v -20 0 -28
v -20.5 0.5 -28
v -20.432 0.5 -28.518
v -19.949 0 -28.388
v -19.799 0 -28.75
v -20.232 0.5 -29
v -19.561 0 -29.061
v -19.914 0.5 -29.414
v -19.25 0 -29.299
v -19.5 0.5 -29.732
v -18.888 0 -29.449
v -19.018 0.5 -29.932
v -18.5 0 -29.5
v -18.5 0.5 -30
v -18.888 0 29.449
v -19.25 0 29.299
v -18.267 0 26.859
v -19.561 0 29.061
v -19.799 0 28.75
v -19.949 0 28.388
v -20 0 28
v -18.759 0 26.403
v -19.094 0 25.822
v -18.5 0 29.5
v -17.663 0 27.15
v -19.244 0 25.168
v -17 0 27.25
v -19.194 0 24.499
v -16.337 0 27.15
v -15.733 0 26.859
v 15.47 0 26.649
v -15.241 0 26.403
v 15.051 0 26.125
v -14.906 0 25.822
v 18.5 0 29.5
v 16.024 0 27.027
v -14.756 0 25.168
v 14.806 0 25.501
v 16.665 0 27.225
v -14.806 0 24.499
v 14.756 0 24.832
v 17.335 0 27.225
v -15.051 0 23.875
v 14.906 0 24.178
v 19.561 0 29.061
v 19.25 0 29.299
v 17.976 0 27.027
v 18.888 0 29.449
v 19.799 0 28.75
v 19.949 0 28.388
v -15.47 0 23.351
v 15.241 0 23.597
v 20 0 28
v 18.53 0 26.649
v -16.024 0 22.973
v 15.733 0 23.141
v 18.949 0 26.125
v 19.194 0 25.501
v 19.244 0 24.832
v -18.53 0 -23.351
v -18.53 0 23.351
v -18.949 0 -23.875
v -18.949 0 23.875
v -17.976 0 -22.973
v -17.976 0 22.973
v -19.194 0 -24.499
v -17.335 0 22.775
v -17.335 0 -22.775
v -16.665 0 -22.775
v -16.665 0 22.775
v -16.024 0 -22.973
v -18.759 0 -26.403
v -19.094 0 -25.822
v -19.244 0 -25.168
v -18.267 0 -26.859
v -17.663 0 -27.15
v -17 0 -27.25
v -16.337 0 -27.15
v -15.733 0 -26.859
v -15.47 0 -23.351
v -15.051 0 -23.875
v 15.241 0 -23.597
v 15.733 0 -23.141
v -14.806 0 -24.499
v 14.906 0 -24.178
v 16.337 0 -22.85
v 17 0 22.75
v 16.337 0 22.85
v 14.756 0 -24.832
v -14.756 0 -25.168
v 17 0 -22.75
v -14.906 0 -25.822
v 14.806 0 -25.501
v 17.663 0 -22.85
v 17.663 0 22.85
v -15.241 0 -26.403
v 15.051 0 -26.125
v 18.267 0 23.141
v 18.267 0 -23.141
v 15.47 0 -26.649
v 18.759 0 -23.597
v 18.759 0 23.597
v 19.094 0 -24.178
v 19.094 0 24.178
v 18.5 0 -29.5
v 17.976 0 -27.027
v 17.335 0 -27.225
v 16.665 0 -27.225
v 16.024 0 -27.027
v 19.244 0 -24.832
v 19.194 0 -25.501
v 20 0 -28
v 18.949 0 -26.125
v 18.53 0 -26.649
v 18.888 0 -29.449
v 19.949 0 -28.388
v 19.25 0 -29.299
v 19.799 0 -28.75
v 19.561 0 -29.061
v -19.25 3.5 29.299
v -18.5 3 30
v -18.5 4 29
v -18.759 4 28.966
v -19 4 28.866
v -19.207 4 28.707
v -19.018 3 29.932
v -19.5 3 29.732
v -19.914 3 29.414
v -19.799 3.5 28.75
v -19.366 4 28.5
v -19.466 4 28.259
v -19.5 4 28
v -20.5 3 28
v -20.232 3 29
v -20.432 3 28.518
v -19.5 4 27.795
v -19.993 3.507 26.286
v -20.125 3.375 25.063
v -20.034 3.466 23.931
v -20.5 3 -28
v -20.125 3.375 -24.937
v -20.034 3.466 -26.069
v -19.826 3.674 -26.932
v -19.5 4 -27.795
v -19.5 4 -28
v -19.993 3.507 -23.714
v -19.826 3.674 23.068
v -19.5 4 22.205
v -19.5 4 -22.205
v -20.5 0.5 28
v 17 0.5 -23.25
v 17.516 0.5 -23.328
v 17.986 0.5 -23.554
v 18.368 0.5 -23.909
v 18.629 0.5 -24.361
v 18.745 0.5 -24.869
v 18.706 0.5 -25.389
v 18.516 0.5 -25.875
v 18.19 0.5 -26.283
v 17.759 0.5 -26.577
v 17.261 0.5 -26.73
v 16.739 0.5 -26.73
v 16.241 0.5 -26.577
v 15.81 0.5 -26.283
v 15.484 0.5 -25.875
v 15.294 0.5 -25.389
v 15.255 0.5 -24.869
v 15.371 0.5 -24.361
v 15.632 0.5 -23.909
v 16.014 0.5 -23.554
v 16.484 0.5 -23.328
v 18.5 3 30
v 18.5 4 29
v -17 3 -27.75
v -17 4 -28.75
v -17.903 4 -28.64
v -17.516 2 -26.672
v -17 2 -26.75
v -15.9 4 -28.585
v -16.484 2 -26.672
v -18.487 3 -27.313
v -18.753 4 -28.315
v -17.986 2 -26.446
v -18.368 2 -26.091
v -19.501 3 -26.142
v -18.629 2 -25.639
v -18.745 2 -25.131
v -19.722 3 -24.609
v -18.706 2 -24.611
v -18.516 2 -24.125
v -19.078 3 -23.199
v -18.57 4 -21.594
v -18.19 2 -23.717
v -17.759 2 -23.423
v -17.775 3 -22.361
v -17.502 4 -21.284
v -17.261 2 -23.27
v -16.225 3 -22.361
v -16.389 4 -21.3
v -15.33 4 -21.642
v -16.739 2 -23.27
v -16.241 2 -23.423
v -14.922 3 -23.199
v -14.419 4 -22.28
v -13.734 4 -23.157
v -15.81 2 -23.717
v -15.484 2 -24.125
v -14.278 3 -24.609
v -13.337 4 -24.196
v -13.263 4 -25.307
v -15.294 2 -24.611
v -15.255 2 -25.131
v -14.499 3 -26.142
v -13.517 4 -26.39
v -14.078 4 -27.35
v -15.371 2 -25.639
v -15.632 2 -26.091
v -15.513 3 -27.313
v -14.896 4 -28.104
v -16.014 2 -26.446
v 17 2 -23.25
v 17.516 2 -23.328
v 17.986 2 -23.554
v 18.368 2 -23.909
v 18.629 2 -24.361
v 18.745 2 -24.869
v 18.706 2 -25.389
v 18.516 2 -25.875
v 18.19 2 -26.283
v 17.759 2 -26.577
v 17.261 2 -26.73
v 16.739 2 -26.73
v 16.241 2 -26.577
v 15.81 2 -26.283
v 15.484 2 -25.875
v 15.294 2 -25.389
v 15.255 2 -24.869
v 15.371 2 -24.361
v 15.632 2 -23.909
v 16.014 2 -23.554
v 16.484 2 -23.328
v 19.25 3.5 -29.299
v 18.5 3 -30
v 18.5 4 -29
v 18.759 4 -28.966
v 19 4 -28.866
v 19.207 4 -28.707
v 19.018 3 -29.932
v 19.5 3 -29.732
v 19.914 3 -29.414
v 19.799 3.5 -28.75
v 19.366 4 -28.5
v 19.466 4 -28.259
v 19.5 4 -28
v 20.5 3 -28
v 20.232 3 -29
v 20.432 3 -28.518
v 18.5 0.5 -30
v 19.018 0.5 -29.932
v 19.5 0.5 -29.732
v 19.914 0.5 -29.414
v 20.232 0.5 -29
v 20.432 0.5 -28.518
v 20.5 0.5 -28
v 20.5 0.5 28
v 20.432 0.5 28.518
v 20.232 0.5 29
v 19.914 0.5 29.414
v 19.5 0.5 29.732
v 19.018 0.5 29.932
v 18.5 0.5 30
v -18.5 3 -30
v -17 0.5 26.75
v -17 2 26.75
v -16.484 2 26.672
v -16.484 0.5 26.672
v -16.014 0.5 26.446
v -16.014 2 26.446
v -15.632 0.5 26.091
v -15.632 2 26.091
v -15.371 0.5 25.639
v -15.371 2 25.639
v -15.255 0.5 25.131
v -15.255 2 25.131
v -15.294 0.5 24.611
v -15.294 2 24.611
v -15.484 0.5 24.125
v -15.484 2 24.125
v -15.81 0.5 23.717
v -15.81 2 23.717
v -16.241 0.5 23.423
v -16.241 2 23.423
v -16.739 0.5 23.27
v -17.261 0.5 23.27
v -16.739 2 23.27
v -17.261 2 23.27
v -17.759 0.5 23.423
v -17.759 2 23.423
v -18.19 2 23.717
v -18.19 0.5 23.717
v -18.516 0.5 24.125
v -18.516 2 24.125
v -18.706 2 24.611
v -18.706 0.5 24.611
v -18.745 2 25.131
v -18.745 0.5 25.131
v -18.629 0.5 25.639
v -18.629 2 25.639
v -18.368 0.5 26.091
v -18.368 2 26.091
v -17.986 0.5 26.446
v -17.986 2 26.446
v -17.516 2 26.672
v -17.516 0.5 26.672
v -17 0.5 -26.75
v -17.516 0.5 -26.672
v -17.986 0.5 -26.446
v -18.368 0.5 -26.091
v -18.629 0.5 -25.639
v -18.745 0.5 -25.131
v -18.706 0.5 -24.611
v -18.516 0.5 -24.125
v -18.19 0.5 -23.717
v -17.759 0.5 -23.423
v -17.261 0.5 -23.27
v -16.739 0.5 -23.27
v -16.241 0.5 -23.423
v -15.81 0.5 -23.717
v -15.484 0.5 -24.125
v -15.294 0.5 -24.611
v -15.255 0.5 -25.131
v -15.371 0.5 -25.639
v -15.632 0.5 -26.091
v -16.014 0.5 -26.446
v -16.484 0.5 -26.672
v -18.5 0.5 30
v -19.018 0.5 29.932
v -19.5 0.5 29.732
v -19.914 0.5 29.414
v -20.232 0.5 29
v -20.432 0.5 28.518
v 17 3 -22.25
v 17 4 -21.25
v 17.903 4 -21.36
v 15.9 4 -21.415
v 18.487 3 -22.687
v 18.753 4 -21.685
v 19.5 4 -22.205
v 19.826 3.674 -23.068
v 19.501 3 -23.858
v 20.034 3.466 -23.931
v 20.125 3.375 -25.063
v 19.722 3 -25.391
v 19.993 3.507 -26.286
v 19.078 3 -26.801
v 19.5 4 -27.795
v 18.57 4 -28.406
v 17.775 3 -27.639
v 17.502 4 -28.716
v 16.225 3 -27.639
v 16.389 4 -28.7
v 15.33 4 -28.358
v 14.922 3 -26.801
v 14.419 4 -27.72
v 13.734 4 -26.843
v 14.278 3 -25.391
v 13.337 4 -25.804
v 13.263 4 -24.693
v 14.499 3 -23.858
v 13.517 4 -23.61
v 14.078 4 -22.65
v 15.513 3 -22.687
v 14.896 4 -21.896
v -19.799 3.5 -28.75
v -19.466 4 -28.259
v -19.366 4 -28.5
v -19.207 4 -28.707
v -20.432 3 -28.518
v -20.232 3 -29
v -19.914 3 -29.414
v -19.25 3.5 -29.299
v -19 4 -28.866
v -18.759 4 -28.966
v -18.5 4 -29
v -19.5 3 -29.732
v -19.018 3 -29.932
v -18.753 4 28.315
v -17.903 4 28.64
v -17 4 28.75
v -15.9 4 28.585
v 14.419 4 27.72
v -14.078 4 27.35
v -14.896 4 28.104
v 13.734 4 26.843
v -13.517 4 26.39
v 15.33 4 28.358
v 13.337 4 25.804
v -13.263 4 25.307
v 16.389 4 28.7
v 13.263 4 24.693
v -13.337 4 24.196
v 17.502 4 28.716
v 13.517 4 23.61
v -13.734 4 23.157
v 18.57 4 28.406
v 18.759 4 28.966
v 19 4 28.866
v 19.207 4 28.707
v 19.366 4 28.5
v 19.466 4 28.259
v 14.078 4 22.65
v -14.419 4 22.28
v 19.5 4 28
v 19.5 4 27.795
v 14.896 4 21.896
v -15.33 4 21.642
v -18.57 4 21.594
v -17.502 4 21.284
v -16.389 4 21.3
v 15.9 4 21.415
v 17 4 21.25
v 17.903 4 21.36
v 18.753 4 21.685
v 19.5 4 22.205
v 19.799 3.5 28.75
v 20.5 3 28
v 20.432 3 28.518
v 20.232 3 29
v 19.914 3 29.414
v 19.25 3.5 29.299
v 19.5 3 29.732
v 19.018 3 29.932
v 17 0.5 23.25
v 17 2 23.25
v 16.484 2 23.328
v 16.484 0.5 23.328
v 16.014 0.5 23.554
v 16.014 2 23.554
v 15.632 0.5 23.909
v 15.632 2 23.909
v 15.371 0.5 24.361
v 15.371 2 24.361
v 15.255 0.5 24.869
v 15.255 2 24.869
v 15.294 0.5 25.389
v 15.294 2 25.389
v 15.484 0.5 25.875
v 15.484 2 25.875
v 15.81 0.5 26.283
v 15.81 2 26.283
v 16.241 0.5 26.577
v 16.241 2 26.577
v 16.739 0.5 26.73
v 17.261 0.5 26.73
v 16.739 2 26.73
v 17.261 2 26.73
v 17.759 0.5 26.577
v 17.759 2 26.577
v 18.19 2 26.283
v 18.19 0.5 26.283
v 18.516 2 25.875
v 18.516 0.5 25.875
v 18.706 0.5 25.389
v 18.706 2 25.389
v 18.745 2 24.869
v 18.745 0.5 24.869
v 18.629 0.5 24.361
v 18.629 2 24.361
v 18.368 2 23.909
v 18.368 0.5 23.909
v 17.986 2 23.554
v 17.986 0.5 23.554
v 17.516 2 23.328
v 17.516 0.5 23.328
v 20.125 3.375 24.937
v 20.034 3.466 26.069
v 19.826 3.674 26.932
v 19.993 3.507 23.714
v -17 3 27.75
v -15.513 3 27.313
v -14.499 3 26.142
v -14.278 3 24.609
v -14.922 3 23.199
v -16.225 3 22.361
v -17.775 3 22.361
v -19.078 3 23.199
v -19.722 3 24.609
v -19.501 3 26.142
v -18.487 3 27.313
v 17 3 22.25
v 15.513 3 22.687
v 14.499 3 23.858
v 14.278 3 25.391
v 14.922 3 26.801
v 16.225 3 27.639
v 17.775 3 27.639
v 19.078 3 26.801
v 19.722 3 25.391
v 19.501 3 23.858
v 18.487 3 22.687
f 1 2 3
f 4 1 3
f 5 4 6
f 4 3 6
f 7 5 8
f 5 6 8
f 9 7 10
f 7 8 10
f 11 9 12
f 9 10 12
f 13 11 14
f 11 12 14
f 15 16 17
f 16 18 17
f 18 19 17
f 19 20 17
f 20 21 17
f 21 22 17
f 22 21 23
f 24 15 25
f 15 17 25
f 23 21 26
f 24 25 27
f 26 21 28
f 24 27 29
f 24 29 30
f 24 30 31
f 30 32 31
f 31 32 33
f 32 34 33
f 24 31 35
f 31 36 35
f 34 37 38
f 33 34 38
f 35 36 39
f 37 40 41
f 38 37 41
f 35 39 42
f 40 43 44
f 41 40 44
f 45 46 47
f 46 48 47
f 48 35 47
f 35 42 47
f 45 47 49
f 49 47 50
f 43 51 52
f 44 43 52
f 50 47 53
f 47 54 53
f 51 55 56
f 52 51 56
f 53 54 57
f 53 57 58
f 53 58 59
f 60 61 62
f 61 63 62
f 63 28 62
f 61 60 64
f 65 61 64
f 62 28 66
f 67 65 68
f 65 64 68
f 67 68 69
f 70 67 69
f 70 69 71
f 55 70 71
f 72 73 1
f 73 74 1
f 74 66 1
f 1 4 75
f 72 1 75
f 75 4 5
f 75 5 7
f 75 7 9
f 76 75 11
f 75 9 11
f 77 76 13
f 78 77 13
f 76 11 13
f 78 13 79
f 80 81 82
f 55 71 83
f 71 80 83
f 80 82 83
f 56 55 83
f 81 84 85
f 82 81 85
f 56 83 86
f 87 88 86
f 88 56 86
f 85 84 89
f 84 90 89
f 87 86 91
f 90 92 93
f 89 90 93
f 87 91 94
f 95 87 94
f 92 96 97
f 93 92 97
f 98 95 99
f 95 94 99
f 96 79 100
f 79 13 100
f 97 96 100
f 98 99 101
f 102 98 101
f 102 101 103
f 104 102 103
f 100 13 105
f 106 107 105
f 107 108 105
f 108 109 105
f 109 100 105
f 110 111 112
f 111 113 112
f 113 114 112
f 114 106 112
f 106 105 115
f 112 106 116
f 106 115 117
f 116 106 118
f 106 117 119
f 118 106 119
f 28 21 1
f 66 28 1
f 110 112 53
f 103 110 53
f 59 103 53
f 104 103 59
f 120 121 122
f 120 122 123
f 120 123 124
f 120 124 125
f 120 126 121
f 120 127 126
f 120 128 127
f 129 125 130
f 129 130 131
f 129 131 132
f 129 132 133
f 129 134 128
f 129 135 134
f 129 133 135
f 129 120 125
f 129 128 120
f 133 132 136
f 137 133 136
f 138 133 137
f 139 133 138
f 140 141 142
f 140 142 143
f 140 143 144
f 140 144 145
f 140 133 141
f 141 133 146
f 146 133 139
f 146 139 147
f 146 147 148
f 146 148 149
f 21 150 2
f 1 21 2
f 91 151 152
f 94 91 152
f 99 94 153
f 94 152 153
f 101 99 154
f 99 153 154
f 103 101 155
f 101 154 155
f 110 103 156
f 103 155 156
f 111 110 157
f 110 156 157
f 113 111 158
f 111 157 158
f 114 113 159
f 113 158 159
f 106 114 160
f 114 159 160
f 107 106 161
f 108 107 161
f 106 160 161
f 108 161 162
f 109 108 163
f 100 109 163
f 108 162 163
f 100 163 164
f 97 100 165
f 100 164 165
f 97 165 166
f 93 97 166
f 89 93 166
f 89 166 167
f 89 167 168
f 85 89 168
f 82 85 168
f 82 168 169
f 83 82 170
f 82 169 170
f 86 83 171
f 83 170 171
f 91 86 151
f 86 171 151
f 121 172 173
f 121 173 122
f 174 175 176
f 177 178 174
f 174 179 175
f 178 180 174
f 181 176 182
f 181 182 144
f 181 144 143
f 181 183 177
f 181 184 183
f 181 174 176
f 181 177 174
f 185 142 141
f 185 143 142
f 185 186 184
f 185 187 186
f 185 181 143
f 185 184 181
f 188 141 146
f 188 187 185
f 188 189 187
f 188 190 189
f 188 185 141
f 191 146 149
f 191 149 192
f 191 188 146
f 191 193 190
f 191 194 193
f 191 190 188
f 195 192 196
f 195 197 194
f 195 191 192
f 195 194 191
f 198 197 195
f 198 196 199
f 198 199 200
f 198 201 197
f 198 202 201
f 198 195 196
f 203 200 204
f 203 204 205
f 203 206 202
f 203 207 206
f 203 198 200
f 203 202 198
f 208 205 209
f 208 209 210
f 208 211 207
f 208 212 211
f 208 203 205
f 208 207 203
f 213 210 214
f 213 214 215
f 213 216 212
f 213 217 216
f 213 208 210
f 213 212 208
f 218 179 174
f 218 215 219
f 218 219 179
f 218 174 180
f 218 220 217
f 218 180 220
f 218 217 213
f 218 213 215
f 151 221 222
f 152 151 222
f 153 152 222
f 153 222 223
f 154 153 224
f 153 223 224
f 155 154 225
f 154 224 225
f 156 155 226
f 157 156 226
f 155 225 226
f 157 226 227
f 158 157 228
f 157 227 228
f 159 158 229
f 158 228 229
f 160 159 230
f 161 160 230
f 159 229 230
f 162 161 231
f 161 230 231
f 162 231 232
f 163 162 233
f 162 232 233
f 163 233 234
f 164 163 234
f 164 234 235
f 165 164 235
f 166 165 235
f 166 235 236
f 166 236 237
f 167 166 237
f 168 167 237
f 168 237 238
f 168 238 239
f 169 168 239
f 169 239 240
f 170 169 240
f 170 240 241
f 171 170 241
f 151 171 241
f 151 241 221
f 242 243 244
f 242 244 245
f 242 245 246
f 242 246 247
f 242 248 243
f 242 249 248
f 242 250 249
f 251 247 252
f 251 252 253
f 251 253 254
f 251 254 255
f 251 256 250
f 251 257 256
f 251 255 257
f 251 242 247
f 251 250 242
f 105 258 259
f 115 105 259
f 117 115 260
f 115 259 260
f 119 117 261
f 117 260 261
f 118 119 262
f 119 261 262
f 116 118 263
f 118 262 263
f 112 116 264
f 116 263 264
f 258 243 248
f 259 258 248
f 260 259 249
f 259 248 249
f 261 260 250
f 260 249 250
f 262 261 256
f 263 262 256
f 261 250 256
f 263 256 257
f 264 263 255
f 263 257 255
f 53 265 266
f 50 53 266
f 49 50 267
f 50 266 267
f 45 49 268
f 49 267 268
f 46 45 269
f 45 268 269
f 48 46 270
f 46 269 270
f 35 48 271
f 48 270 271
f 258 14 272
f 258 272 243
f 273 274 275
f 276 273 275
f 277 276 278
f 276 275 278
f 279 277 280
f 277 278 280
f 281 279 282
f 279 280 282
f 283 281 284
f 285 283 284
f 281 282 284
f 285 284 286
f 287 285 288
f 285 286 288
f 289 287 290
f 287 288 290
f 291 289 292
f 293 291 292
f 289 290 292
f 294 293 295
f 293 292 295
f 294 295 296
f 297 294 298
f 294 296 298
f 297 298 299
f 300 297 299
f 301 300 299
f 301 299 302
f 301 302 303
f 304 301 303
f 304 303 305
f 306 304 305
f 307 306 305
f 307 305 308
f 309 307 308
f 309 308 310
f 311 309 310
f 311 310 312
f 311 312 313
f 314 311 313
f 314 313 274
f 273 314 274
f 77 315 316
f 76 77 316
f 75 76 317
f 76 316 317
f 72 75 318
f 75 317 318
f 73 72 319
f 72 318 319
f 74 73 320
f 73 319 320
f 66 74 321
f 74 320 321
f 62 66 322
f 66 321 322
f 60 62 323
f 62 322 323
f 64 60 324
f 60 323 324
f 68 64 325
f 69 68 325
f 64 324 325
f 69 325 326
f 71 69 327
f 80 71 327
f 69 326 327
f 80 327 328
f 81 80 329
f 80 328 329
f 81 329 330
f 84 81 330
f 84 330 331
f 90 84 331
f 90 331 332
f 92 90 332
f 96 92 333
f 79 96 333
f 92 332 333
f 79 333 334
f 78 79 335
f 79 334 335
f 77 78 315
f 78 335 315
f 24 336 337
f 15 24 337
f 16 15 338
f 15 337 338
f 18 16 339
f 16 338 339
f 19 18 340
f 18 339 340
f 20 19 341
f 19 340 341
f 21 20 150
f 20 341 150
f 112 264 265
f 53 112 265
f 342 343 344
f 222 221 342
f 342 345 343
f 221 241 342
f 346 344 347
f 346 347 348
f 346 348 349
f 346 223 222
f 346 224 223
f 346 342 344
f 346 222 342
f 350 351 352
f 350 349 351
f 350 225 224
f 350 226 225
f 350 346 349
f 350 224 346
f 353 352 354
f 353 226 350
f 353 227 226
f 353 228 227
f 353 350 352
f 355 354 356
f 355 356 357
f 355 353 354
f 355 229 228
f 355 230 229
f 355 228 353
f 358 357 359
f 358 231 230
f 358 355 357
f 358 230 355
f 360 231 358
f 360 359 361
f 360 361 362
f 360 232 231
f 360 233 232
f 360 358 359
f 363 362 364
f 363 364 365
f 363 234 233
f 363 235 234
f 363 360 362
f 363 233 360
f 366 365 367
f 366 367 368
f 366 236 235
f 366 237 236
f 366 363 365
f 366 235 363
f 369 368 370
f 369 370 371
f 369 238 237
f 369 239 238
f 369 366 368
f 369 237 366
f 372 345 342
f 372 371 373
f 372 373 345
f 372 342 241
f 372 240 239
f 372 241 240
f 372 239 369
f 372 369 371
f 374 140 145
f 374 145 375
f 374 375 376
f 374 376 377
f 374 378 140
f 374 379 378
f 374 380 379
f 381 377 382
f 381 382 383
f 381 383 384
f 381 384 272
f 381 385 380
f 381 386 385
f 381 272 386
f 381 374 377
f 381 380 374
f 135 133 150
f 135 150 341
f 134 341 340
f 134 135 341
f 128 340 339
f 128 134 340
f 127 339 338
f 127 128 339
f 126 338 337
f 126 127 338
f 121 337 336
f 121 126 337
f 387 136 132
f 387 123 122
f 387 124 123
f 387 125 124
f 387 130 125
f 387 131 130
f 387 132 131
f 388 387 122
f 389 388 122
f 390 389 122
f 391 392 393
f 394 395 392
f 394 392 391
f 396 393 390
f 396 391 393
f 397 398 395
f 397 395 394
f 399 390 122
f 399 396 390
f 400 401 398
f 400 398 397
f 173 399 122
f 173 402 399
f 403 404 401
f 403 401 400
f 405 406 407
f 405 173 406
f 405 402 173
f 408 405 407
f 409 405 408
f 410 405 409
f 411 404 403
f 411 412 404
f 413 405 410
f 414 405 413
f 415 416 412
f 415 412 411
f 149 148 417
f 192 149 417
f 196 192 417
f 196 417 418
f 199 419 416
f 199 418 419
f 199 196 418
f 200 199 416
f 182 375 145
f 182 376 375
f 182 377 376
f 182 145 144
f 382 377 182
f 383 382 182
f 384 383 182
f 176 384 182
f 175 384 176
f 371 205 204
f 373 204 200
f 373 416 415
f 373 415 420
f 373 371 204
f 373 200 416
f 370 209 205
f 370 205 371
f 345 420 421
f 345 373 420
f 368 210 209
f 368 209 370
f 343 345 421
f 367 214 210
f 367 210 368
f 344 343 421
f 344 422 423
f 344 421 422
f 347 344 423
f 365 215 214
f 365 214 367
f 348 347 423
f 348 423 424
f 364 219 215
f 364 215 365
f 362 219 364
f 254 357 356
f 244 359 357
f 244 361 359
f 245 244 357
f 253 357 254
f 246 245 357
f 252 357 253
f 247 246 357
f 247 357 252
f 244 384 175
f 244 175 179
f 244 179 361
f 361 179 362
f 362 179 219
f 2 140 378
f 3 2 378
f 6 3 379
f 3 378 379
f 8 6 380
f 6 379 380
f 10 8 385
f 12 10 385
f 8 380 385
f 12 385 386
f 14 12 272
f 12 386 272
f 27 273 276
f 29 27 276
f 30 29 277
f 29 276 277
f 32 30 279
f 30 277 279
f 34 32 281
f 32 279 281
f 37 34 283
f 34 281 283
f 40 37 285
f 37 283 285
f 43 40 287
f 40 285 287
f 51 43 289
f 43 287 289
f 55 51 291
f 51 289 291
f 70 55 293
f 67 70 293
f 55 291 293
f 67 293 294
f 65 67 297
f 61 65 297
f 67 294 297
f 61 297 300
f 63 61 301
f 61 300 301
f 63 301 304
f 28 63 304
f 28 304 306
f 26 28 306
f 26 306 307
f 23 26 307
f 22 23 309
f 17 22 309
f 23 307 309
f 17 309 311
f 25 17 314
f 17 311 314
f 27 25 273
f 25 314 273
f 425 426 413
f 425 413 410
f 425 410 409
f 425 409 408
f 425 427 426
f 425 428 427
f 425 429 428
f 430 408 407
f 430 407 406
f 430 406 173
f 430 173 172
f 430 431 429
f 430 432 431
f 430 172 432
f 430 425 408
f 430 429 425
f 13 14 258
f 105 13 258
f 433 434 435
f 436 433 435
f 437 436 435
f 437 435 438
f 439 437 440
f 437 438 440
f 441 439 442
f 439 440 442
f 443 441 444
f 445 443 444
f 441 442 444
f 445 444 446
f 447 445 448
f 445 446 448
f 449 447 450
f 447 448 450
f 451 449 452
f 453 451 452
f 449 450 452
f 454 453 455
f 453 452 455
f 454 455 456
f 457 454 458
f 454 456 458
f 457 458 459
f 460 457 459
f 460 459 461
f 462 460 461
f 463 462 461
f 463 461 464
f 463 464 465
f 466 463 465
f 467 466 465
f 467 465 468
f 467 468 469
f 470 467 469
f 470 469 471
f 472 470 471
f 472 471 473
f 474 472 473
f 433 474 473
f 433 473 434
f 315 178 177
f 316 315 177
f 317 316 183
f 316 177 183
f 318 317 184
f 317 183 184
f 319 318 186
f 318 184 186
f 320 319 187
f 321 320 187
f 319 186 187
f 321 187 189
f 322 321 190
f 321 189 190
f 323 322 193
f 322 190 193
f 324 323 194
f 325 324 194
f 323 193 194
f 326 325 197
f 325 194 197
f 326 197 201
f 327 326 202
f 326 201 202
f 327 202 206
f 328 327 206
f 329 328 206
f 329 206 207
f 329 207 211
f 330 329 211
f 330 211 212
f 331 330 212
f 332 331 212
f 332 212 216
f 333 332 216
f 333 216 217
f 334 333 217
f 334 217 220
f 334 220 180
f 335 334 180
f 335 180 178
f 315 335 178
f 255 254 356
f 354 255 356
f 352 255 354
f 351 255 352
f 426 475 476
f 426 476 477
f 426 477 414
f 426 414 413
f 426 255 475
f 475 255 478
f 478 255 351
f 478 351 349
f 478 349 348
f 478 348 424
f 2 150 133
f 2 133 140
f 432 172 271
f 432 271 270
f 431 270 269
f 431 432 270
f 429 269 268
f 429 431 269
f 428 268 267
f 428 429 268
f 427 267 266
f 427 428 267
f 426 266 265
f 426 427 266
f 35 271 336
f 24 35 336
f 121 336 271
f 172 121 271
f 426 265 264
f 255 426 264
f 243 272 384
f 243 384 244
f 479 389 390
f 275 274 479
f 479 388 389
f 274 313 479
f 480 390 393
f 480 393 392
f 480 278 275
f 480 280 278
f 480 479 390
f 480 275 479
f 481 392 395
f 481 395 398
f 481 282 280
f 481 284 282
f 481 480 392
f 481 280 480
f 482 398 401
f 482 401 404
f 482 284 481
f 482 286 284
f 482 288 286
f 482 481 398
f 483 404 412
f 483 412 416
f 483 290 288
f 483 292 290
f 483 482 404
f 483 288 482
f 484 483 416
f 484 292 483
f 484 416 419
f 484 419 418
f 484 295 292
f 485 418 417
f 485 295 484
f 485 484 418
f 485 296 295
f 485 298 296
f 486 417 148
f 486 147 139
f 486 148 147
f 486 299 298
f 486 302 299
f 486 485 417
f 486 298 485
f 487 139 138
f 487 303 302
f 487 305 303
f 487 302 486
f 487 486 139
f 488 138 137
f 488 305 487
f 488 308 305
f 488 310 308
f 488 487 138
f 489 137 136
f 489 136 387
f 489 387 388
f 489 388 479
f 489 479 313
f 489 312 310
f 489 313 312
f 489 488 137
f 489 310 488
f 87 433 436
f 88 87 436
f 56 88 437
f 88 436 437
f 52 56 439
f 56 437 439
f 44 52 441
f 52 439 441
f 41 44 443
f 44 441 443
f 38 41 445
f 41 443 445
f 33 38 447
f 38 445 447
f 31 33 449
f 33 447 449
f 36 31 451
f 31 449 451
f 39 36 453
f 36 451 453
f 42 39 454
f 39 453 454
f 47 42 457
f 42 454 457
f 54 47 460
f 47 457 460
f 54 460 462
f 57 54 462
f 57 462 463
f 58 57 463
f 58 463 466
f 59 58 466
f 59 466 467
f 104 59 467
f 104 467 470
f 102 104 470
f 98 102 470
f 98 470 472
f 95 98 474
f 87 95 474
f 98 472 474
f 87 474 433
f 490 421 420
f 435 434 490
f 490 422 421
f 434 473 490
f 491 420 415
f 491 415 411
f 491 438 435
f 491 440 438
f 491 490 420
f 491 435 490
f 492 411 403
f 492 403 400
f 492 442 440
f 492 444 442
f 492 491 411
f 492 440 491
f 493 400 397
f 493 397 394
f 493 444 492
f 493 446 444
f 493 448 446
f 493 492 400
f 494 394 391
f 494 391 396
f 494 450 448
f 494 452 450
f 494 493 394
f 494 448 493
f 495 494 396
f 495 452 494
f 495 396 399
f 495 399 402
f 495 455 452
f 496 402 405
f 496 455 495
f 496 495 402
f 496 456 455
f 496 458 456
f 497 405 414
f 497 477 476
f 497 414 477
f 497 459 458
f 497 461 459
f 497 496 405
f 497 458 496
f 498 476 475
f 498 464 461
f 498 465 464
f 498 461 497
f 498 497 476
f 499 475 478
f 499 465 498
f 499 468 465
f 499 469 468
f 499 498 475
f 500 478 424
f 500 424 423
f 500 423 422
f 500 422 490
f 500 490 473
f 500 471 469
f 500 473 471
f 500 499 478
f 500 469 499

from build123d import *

# Parameters (mm, degrees)
SKETCH_1_W          = 41
SKETCH_1_H          = 60
EXTRUDE_1_DEPTH     = 4
SKETCH_2_R          = 1.75
CUT_EXTRUDE_1_DEPTH = 37.554753453
FILLET_1_R          = 2
CHAMFER_2_SIZE      = 1
CHAMFER_1_SIZE      = 2
CHAMFER_3_SIZE      = 0.5


with BuildPart() as part:
    # Эскиз1 → Бобышка-Вытянуть1 (new body)
    with BuildSketch(Plane(origin=(0, 0, 0), x_dir=(1, 0, 0), z_dir=(0, 1, 0))):
        Rectangle(SKETCH_1_W, SKETCH_1_H)
    extrude(amount=EXTRUDE_1_DEPTH)

    # Эскиз2 → Вырез-Вытянуть1 (cut, through all)
    with BuildSketch(Plane(origin=(0, 4, 0), x_dir=(1, 0, 0), z_dir=(0, 1, 0))):
        with Locations(Location((17, 25, 0), (0, 0, 270))):
            Circle(SKETCH_2_R)
        with Locations(Location((17, -25, 0), (0, 0, 90))):
            Circle(SKETCH_2_R)
        with Locations(Location((-17, -25, 0), (0, 0, 270))):
            Circle(SKETCH_2_R)
        with Locations(Location((-17, 25, 0), (0, 0, 90))):
            Circle(SKETCH_2_R)
    extrude(amount=-CUT_EXTRUDE_1_DEPTH, mode=Mode.SUBTRACT)

    # Скругление1
    fillet_1_edges = [part.edges().sort_by_distance(p)[0] for p in [
        (20.5, 2, 30),
        (-20.5, 2, 30),
        (-20.5, 2, -30),
        (20.5, 2, -30),
    ]]
    fillet(fillet_1_edges, radius=FILLET_1_R)

    # Фаска2
    chamfer_2_edges = [part.edges().sort_by_distance(p)[0] for p in [
        (0, 4, -30),
        (20.5, 4, 0),
        (-20.5, 4, 0),
        (0, 4, 30),
        (19.914213562, 4, 29.414213562),
        (-19.914213562, 4, 29.414213562),
        (-19.914213562, 4, -29.414213562),
        (19.914213562, 4, -29.414213562),
    ]]
    chamfer(chamfer_2_edges, length=CHAMFER_2_SIZE)

    # Фаска1
    # the kernel refuses this chamfer: 2 mm, written as the material it takes off along each edge
    with BuildSketch(Plane(origin=(-17, 4, -25), x_dir=(0, 0, -1), z_dir=(1, 0, 0))) as chamfer_1_piece_1:
        Polygon((1.75 + CHAMFER_1_SIZE, 0), (1.75, -CHAMFER_1_SIZE), (1.75, 0), align=None)
    revolve(axis=Axis((-17, 4, -25), (0, 1, 0)), mode=Mode.SUBTRACT)
    with BuildSketch(Plane(origin=(-17, 4, 25), x_dir=(0, 0, 1), z_dir=(-1, 0, 0))) as chamfer_1_piece_2:
        Polygon((1.75 + CHAMFER_1_SIZE, 0), (1.75, -CHAMFER_1_SIZE), (1.75, 0), align=None)
    revolve(axis=Axis((-17, 4, 25), (0, 1, 0)), mode=Mode.SUBTRACT)
    with BuildSketch(Plane(origin=(17, 4, 25), x_dir=(0, 0, -1), z_dir=(1, 0, 0))) as chamfer_1_piece_3:
        Polygon((1.75 + CHAMFER_1_SIZE, 0), (1.75, -CHAMFER_1_SIZE), (1.75, 0), align=None)
    revolve(axis=Axis((17, 4, 25), (0, 1, 0)), mode=Mode.SUBTRACT)
    with BuildSketch(Plane(origin=(17, 4, -25), x_dir=(0, 0, 1), z_dir=(-1, 0, 0))) as chamfer_1_piece_4:
        Polygon((1.75 + CHAMFER_1_SIZE, 0), (1.75, -CHAMFER_1_SIZE), (1.75, 0), align=None)
    revolve(axis=Axis((17, 4, -25), (0, 1, 0)), mode=Mode.SUBTRACT)

    # Фаска3
    chamfer_3_edges = [part.edges().sort_by_distance(p)[0] for p in [
        (-17, 0, -23.25),
        (-17, 0, 23.25),
        (17, 0, 26.75),
        (17, 0, -26.75),
        (0, 0, -30),
        (20.5, 0, 0),
        (0, 0, 30),
        (-20.5, 0, 0),
        (19.914213562, 0, 29.414213562),
        (-19.914213562, 0, 29.414213562),
        (-19.914213562, 0, -29.414213562),
        (19.914213562, 0, -29.414213562),
    ]]
    chamfer(chamfer_3_edges, length=CHAMFER_3_SIZE)


solid = part.part
